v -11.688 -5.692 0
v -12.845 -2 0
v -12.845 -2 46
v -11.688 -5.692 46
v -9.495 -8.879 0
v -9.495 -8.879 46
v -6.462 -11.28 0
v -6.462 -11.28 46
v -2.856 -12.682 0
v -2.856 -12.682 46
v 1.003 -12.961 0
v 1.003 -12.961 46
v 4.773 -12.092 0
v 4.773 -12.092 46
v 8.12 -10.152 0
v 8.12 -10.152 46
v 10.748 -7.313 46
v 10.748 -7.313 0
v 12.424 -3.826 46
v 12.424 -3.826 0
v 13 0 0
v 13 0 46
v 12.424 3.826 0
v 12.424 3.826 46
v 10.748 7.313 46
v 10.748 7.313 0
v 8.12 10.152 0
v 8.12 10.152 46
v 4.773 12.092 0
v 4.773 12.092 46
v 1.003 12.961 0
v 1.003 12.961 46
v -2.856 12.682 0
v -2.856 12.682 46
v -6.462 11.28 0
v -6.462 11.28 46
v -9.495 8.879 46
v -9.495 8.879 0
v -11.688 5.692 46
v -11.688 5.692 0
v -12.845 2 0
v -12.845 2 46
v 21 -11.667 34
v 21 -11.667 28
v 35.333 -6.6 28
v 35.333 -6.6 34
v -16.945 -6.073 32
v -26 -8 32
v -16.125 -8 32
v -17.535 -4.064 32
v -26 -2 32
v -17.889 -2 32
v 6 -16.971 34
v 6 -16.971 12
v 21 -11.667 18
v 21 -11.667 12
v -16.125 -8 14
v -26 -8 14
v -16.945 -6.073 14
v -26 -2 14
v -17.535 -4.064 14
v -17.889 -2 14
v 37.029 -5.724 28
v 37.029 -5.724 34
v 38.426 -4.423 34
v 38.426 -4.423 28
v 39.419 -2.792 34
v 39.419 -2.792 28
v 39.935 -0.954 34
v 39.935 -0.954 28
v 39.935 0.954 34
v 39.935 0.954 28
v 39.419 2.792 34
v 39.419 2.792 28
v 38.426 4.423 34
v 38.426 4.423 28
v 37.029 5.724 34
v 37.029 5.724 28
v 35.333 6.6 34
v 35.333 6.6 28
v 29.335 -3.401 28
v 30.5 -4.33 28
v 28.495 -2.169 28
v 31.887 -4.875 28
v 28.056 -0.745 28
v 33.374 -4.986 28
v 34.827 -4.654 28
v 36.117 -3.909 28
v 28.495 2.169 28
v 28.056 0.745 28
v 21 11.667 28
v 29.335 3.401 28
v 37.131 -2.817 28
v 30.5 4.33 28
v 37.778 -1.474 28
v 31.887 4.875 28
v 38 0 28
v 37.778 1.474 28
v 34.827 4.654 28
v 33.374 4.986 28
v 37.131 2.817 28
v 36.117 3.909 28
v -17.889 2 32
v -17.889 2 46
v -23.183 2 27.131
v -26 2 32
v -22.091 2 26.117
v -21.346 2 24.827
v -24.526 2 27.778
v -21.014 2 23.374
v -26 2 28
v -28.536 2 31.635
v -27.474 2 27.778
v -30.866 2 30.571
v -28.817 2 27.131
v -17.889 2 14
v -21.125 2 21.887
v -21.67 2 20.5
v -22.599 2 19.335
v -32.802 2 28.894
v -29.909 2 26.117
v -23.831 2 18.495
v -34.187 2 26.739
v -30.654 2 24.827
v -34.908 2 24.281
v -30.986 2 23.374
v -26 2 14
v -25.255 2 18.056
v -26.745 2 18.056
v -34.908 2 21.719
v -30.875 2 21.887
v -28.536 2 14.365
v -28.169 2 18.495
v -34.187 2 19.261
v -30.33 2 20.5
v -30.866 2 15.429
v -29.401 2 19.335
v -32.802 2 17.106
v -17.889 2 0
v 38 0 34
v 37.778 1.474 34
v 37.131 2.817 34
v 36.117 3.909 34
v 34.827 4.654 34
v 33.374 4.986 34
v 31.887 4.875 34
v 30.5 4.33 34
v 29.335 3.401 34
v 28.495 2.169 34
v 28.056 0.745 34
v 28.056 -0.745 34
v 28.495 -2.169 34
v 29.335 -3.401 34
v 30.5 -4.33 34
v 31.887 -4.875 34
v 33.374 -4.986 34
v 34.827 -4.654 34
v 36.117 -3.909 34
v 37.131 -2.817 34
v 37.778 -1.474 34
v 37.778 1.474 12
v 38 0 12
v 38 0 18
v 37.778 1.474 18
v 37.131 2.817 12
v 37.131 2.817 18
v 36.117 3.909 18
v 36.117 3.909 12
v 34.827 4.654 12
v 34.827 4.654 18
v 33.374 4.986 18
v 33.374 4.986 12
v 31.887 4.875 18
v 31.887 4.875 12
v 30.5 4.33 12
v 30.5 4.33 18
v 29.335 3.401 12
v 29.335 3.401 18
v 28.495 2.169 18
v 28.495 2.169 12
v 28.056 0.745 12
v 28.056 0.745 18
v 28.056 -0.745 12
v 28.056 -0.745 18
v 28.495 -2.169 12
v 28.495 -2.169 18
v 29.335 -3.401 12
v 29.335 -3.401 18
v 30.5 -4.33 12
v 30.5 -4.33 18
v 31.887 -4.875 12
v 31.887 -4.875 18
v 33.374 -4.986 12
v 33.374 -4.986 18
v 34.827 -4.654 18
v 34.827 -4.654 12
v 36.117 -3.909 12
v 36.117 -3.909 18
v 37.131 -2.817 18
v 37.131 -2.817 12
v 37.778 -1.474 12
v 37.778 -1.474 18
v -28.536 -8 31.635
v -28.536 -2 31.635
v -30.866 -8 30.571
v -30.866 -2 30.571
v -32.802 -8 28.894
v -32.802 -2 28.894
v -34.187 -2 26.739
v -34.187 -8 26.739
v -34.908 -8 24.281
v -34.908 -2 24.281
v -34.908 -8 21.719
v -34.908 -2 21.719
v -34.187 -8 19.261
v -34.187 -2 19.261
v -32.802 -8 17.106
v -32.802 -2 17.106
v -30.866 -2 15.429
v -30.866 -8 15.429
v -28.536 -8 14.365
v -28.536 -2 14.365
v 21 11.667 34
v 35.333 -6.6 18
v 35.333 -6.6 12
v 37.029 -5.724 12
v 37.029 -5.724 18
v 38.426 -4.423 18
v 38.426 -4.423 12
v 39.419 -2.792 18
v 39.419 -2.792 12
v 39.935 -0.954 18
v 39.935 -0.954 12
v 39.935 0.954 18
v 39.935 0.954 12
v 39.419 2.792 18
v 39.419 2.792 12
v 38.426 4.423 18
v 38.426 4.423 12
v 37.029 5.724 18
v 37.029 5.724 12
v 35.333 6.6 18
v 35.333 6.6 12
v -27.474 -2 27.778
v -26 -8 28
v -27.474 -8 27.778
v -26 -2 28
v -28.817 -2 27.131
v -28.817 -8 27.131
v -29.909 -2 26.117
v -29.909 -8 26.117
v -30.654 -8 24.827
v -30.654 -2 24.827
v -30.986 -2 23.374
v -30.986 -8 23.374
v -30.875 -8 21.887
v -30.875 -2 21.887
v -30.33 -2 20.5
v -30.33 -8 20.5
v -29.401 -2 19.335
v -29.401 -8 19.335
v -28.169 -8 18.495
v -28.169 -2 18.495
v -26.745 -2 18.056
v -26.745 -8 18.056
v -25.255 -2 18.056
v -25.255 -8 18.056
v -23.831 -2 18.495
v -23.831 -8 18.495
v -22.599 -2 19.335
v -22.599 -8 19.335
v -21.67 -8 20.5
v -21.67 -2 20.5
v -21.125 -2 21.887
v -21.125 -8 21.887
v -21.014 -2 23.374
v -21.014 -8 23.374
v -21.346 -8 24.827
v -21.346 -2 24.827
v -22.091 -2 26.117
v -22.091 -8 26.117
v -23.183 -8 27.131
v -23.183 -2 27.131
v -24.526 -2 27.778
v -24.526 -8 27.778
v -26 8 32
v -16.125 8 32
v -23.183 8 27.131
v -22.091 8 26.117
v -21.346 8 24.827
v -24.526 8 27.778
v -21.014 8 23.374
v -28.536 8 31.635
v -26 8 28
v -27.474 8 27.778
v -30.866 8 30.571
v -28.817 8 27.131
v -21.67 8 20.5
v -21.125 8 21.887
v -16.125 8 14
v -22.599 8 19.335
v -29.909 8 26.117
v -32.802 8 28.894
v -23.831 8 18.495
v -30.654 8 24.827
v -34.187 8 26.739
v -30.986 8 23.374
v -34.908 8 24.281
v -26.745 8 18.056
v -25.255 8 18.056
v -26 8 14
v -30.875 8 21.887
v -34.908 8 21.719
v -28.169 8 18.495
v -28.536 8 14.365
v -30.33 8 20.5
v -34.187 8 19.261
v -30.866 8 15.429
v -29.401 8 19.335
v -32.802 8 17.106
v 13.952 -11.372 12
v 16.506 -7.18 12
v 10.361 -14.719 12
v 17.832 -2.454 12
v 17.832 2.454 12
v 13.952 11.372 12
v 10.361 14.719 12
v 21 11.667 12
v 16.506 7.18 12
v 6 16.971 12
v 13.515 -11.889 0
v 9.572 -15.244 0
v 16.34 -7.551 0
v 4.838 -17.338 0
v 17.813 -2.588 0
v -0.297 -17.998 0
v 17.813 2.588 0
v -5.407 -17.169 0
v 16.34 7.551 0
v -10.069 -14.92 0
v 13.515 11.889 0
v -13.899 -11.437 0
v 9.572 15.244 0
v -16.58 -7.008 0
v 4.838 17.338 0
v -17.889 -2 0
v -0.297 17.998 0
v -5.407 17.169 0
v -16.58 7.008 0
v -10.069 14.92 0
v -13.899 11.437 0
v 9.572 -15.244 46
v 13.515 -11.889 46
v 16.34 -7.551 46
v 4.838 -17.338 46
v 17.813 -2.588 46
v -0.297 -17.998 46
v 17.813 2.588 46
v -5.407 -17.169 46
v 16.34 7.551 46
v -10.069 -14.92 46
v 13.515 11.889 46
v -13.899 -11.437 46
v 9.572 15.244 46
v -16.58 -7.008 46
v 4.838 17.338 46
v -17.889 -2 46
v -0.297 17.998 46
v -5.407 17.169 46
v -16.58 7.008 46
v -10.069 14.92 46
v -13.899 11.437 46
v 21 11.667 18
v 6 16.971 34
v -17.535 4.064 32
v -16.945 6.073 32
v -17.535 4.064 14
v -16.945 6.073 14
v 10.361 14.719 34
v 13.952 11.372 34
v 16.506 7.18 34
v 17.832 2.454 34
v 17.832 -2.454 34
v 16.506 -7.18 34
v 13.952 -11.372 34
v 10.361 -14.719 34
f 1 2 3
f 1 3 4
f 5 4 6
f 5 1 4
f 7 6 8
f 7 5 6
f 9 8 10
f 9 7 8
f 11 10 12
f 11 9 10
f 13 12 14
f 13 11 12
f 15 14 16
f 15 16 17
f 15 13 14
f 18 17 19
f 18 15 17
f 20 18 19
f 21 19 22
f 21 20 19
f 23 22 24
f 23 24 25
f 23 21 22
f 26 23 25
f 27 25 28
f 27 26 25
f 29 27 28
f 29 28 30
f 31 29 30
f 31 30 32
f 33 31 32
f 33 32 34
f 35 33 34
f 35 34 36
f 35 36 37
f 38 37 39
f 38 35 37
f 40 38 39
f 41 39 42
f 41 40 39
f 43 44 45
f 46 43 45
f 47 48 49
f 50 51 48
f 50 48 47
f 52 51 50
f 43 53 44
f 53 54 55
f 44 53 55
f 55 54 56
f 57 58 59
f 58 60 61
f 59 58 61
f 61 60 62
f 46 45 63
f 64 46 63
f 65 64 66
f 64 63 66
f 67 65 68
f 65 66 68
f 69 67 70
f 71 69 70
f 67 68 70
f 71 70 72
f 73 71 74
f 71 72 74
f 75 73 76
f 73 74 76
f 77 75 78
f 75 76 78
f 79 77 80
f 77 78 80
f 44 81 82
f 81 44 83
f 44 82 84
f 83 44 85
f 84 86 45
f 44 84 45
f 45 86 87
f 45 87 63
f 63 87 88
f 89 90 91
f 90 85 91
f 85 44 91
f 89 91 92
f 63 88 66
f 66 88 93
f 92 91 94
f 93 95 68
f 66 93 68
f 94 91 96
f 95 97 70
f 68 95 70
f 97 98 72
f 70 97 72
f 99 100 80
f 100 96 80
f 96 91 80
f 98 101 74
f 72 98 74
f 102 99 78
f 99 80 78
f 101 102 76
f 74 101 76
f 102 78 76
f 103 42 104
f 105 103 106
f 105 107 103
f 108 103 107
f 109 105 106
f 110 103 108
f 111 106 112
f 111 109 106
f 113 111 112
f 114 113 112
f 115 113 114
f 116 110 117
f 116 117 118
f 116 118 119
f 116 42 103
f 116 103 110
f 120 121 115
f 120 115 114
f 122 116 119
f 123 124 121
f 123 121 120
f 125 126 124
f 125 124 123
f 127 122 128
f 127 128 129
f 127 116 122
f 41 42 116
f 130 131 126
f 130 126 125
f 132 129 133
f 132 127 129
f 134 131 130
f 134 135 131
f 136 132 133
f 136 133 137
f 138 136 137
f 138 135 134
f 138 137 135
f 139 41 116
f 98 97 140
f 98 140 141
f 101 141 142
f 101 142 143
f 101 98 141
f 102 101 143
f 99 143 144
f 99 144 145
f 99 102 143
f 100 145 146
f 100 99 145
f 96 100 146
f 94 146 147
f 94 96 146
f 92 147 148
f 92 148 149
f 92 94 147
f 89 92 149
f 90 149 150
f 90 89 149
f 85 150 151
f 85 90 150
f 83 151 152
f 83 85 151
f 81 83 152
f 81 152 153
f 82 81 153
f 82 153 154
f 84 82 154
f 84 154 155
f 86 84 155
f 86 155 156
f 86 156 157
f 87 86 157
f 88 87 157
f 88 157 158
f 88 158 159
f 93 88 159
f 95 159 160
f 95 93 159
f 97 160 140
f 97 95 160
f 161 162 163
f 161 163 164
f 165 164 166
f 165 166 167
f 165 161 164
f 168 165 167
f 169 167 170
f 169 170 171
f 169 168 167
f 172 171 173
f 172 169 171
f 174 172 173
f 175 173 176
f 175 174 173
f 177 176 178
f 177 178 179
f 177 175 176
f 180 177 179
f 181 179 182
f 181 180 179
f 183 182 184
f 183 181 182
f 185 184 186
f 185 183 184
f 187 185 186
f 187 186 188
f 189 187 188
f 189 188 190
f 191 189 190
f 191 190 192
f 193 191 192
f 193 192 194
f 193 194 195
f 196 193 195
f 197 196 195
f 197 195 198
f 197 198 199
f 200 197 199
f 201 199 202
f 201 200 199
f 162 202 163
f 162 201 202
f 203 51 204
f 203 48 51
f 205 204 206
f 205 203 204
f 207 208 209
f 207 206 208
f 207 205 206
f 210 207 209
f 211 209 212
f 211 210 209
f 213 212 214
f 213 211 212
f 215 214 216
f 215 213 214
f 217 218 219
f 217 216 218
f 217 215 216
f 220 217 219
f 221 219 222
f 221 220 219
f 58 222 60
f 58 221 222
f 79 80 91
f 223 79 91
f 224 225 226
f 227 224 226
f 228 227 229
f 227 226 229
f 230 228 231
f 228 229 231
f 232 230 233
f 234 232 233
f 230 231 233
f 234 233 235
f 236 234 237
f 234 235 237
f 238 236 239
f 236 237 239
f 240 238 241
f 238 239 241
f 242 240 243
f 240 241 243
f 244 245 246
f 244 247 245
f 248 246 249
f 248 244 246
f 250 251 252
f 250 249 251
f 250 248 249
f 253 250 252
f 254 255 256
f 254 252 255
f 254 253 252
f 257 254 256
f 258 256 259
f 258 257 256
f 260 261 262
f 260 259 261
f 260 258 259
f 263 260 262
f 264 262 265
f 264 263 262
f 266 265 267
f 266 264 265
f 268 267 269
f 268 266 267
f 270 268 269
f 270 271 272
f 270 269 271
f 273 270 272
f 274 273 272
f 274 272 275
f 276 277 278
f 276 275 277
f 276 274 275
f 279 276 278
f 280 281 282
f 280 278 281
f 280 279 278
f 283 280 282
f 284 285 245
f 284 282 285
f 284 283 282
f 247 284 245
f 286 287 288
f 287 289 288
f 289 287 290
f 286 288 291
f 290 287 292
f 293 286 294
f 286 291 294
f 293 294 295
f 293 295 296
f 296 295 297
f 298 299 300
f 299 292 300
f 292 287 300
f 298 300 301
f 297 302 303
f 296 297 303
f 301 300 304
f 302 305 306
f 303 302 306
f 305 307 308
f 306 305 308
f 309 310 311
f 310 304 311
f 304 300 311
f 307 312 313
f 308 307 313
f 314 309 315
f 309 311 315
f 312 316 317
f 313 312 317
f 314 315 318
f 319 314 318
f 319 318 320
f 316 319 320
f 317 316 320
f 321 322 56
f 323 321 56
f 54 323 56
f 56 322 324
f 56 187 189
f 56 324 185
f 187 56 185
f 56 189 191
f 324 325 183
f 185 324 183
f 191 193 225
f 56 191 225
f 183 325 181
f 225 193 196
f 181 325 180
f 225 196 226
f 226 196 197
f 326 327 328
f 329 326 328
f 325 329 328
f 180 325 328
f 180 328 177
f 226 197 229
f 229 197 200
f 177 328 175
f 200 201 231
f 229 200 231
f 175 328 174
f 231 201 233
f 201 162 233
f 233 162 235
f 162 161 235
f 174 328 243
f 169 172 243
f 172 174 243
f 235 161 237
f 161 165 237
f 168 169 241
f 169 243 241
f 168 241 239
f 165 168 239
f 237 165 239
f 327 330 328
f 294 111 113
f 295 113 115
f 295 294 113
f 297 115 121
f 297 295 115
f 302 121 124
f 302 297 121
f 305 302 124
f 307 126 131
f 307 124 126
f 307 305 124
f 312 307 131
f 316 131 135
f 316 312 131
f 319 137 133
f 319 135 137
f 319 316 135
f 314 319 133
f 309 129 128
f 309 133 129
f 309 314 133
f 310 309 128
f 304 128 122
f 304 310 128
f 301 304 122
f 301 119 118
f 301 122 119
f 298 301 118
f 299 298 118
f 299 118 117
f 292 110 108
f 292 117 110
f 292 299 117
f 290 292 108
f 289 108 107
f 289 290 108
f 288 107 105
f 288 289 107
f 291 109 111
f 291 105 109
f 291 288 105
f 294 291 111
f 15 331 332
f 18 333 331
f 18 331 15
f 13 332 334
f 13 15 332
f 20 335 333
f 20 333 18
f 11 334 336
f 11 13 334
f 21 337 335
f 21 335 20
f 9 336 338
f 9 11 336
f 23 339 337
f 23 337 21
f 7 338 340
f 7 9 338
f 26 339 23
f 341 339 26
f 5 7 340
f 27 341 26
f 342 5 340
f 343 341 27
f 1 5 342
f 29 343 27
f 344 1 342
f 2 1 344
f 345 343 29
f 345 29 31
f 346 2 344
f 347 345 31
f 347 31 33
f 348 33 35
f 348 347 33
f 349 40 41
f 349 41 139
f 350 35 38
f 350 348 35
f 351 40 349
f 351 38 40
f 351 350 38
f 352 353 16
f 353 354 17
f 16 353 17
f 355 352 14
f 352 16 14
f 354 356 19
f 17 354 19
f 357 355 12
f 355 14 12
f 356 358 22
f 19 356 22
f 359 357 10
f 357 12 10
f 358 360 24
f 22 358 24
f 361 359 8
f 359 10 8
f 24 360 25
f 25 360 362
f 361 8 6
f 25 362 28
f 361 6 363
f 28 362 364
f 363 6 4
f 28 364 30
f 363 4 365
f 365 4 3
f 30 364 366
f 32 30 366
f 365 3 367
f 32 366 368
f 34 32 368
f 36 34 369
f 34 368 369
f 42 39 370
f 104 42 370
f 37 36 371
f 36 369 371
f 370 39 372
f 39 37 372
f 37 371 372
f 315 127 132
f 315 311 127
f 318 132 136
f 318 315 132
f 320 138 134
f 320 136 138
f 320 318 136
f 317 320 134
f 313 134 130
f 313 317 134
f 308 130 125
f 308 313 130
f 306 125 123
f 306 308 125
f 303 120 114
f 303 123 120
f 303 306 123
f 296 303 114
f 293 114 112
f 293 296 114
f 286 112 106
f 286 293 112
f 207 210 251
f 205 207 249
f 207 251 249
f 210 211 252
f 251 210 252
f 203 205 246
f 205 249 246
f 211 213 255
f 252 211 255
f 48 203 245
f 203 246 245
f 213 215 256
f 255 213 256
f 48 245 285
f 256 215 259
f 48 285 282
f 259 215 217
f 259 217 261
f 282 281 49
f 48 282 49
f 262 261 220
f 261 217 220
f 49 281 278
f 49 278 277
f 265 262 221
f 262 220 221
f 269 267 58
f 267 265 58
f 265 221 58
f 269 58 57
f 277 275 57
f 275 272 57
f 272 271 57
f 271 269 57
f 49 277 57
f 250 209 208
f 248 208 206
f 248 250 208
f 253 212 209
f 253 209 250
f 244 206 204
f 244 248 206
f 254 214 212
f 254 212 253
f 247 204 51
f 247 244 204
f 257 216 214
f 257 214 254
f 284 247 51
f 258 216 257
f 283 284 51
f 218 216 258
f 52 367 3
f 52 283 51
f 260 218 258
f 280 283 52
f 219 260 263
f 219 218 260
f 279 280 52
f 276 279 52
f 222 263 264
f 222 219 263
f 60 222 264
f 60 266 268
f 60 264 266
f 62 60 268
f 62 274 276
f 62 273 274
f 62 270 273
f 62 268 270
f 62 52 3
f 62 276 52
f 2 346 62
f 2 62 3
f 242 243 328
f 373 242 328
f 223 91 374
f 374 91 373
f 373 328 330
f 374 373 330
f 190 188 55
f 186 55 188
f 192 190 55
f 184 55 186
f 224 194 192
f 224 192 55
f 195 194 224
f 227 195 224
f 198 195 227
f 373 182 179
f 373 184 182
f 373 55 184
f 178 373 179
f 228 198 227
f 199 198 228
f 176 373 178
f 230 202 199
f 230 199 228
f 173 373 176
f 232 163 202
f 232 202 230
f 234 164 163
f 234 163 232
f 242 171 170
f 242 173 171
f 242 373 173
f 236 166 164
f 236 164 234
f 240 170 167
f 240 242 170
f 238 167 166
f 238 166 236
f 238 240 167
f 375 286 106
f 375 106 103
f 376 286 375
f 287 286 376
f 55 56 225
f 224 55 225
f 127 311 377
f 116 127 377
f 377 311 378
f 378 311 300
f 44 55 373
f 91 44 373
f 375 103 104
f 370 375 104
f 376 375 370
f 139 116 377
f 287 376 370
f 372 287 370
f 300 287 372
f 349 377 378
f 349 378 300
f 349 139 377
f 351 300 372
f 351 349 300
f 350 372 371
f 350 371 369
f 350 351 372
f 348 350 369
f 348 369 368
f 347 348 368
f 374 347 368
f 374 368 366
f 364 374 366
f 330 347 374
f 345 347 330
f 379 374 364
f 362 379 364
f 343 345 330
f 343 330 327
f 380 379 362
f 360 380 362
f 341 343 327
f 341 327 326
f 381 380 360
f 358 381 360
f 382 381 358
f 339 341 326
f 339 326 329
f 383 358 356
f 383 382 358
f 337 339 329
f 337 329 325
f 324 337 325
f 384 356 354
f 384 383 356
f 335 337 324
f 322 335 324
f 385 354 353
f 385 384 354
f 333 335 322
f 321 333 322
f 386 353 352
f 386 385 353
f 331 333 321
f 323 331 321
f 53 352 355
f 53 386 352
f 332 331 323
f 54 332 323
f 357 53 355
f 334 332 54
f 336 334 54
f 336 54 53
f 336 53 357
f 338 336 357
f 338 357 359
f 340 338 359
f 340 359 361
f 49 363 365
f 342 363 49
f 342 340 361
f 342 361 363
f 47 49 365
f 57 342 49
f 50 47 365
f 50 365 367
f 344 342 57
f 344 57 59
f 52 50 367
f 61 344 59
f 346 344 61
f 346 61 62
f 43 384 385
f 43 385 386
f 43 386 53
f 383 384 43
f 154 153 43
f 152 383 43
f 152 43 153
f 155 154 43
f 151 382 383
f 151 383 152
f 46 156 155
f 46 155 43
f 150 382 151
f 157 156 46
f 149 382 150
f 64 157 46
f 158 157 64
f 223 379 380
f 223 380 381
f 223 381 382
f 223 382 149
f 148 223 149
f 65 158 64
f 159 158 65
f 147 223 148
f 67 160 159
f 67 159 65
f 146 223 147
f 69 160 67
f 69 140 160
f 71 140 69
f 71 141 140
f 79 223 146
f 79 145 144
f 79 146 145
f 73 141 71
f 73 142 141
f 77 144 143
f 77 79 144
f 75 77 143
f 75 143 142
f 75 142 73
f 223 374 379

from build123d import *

# Parameters (mm, degrees)
BOSS_EXTRUDE1_DEPTH = 46
BOSS_EXTRUDE2_START = 12
SKETCH1_3_R         = 5
BOSS_EXTRUDE2_DEPTH = 6
BOSS_EXTRUDE3_START = 28
SKETCH1_4_R         = 5
BOSS_EXTRUDE3_DEPTH = 6
BOSS_EXTRUDE4_START = 14
BOSS_EXTRUDE4_DEPTH = 18
FILLET2_RADIUS      = 9
FILLET2_LENGTH      = 6
FILLET3_RADIUS      = 9
FILLET3_LENGTH      = 6
BOSS_EXTRUDE5_START = 12
BOSS_EXTRUDE5_DEPTH = 22


with BuildPart() as part:
    # Sketch1 → Boss-Extrude1 (new body)
    with BuildSketch(Plane.XY):
        with BuildLine():
            ThreePointArc((-12.845232579, -2), (13, 0), (-12.845232579, 2))
            Line((-12.845232579, 2), (-17.88854382, 2))
            ThreePointArc((-17.88854382, 2), (18, 0), (-17.88854382, -2))
            Line((-17.88854382, -2), (-12.845232579, -2))
        make_face()
    extrude(amount=BOSS_EXTRUDE1_DEPTH)

    # Sketch1<5> → Boss-Extrude4 (add)
    with BuildSketch(Plane.XY.offset(BOSS_EXTRUDE4_START)):
        with BuildLine():
            Line((-35, 2), (-17.88854382, 2))
            ThreePointArc((-17.88854382, 2), (-17.269106839, 5.077198931), (-16.124515497, 8))
            Line((-16.124515497, 8), (-35, 8))
            Line((-35, 8), (-35, 2))
        make_face()
        with BuildLine():
            ThreePointArc((-16.124515497, -8), (-17.269106839, -5.077198931), (-17.88854382, -2))
            Line((-17.88854382, -2), (-35, -2))
            Line((-35, -2), (-35, -8))
            Line((-35, -8), (-16.124515497, -8))
        make_face()
    extrude(amount=BOSS_EXTRUDE4_DEPTH)

    # Fillet2: full round fillet: the end face becomes a half cylinder, R = half its width
    fillet2_face = Plane((-35, 5, 23), x_dir=(0, 1, 0), z_dir=(-1, 0, 0))  # on the end face: x along it, z out of the body
    fillet2_slab = fillet2_face.offset(-FILLET2_RADIUS / 2) * Box(FILLET2_LENGTH, 2 * FILLET2_RADIUS, FILLET2_RADIUS, mode=Mode.PRIVATE)  # the body's end, R deep
    fillet2_round = Plane((-26, 5, 23), x_dir=(-1, 0, 0), z_dir=(0, 1, 0)) * Cylinder(FILLET2_RADIUS, FILLET2_LENGTH, mode=Mode.PRIVATE)  # its axis R under the face
    add(fillet2_slab - fillet2_round, mode=Mode.SUBTRACT)

    # Fillet3: full round fillet: the end face becomes a half cylinder, R = half its width
    fillet3_face = Plane((-35, -5, 23), x_dir=(0, -1, 0), z_dir=(-1, 0, 0))  # on the end face: x along it, z out of the body
    fillet3_slab = fillet3_face.offset(-FILLET3_RADIUS / 2) * Box(FILLET3_LENGTH, 2 * FILLET3_RADIUS, FILLET3_RADIUS, mode=Mode.PRIVATE)  # the body's end, R deep
    fillet3_round = Plane((-26, -5, 23), x_dir=(-1, 0, 0), z_dir=(0, -1, 0)) * Cylinder(FILLET3_RADIUS, FILLET3_LENGTH, mode=Mode.PRIVATE)  # its axis R under the face
    add(fillet3_slab - fillet3_round, mode=Mode.SUBTRACT)

    # Sketch2 → Ø10.0mm Dowel Hole1 (revolve, cut)
    with BuildSketch(Plane(origin=(-26, 8, 23), x_dir=(0, 0, 1), z_dir=(1, 0, 0))):
        Polygon((0, 0), (0, 33.004303095), (5, 30), (5, 0), align=None)
    revolve(axis=Axis((-26, 14.35, 23), (0, -1, 0)), mode=Mode.SUBTRACT)



with BuildPart() as body_2:
    # Sketch1<3> → Boss-Extrude2 (new body)
    with BuildSketch(Plane.XY.offset(BOSS_EXTRUDE2_START)):
        with BuildLine():
            Line((35.333333333, 6.599663291), (21, 11.66726189))
            Line((21, 11.66726189), (21, -11.66726189))
            Line((21, -11.66726189), (35.333333333, -6.599663291))
            ThreePointArc((35.333333333, -6.599663291), (40, 0), (35.333333333, 6.599663291))
        make_face()
        with Locations((33, 0)):
            Circle(SKETCH1_3_R, mode=Mode.SUBTRACT)
    extrude(amount=BOSS_EXTRUDE2_DEPTH)


with BuildPart() as body_3:
    # Sketch1<4> → Boss-Extrude3 (new body)
    with BuildSketch(Plane.XY.offset(BOSS_EXTRUDE3_START)):
        with BuildLine():
            Line((35.333333333, 6.599663291), (21, 11.66726189))
            Line((21, 11.66726189), (21, -11.66726189))
            Line((21, -11.66726189), (35.333333333, -6.599663291))
            ThreePointArc((35.333333333, -6.599663291), (40, 0), (35.333333333, 6.599663291))
        make_face()
        with Locations((33, 0)):
            Circle(SKETCH1_4_R, mode=Mode.SUBTRACT)
    extrude(amount=BOSS_EXTRUDE3_DEPTH)


with BuildPart() as part_1:
    add(part.part)

    add(body_2.part)  # Boss-Extrude5 merges body 2

    add(body_3.part)  # Boss-Extrude5 merges body 3
    # Sketch1<6> → Boss-Extrude5 (add)
    with BuildSketch(Plane.XY.offset(BOSS_EXTRUDE5_START)):
        with BuildLine():
            Line((21, 11.66726189), (6, 16.970562748))
            ThreePointArc((6, 16.970562748), (18, 0), (6, -16.970562748))
            Line((6, -16.970562748), (21, -11.66726189))
            Line((21, -11.66726189), (21, 11.66726189))
        make_face()
    extrude(amount=BOSS_EXTRUDE5_DEPTH)


solid = part_1.part
